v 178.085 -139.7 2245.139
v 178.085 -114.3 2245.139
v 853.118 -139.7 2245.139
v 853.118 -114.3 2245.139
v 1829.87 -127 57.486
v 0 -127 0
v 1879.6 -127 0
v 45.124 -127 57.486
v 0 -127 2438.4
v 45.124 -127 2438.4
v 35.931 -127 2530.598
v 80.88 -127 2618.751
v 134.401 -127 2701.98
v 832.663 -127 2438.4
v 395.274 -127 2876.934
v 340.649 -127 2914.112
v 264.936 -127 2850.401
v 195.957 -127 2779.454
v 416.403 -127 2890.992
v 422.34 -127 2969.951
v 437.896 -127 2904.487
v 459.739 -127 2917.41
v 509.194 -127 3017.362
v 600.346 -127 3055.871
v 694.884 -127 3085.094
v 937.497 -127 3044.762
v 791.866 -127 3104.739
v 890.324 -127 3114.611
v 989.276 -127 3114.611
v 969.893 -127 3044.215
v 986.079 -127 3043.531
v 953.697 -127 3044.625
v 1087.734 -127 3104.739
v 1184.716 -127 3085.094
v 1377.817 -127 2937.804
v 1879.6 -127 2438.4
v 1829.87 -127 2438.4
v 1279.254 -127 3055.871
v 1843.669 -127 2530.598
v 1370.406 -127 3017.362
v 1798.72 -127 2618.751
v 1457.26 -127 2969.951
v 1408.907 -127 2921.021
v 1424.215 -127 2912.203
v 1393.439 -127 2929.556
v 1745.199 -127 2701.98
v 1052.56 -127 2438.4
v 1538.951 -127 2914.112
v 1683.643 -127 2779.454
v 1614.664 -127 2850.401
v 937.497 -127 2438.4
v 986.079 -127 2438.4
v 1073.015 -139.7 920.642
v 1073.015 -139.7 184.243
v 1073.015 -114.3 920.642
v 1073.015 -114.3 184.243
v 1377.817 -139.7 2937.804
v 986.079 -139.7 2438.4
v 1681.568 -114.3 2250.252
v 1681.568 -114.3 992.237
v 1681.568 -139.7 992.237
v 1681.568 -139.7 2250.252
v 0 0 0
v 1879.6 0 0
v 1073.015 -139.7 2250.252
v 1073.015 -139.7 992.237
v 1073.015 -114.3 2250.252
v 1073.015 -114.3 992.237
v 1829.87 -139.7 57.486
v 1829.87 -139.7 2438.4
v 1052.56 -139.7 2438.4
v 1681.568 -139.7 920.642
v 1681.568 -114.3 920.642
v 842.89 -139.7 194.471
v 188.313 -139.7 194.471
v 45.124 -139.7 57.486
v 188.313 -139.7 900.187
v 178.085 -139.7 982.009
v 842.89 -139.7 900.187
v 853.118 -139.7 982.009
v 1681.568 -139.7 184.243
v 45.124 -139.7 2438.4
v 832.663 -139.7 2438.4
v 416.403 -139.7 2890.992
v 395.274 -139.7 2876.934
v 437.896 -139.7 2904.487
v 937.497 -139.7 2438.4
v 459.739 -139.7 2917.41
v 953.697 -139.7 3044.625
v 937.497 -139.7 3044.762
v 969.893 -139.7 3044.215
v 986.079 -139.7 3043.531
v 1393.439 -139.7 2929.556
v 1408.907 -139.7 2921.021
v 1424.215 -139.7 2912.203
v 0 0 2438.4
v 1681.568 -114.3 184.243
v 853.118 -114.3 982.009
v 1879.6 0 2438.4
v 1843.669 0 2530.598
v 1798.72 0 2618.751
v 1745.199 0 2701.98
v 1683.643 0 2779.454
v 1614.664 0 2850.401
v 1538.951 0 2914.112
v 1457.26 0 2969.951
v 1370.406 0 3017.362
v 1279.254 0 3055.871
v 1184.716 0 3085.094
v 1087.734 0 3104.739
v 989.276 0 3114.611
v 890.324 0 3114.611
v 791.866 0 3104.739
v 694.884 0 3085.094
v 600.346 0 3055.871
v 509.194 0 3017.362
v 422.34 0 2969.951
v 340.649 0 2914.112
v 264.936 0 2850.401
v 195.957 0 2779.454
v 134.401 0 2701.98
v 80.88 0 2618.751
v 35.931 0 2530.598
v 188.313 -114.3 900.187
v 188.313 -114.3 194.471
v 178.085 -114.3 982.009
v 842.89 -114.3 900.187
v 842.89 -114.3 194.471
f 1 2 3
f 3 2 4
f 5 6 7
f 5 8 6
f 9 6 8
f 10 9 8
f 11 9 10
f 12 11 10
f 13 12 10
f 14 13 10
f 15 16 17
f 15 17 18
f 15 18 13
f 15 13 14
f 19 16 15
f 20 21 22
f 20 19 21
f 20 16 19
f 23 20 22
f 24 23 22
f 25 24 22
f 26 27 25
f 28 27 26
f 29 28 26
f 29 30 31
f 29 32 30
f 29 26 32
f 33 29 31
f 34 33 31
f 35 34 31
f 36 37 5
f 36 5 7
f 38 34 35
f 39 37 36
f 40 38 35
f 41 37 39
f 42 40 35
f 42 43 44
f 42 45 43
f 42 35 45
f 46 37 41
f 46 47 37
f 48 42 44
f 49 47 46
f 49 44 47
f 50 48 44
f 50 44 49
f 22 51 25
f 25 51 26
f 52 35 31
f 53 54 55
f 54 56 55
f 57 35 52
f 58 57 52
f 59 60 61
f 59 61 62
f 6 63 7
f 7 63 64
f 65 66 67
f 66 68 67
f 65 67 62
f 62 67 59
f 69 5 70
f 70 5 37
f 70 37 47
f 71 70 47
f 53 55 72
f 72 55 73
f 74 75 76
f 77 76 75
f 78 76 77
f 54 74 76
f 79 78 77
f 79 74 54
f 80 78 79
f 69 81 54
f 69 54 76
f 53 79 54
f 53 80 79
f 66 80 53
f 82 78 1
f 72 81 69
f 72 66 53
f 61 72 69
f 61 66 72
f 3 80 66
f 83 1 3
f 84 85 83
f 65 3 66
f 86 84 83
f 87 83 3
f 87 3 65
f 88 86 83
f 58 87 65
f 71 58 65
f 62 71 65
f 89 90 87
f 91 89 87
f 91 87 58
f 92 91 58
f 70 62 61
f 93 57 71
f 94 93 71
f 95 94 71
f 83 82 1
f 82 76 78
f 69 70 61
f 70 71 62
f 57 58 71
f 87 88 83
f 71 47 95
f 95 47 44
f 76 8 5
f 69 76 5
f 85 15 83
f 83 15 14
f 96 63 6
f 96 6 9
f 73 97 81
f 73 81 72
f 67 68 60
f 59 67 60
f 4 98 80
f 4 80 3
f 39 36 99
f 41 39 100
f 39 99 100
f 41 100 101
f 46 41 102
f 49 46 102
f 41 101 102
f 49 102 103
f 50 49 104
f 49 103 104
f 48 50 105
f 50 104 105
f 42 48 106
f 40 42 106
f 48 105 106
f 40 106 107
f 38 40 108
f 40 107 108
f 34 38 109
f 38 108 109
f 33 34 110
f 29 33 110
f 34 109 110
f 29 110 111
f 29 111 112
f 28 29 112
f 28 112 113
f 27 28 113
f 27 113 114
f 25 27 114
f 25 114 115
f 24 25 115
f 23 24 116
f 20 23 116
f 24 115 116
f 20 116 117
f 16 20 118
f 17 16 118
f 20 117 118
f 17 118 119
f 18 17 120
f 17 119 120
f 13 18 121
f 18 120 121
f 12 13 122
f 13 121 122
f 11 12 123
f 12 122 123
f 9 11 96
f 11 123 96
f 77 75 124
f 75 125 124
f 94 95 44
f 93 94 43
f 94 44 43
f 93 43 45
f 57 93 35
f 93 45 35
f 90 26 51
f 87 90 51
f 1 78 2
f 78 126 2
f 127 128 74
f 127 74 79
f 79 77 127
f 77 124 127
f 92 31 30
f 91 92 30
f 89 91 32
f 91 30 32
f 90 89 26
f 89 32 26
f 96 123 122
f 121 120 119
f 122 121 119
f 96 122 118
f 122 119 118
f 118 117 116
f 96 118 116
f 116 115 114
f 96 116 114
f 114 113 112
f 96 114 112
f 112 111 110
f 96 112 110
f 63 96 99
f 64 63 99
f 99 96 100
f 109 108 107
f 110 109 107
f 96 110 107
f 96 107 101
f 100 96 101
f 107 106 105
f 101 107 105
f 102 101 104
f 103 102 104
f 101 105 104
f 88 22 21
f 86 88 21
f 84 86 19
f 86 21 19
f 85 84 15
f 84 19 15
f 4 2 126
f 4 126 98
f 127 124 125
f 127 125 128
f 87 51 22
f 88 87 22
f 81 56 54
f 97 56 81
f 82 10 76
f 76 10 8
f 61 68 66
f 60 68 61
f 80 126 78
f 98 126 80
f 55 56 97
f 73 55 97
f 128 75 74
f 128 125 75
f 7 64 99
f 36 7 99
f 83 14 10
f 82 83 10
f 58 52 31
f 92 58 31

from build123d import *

# Parameters (mm, degrees)
F0_W     = 1879.6
F0_H     = 2438.4
F0_W_2   = 1828.8
F0_H_2   = 2387.6
F1_DEPTH = 127
F2_W     = 675.0328838825
F2_H     = 1263.1295919418
F2_W_2   = 608.5523366928
F2_H_2   = 1258.0157518387
F2_H_3   = 736.3995313644
F2_W_3   = 654.5773297548
F2_H_4   = 705.7162672281
F3_DEPTH = 12.7
F4_W     = 48.5818814486
F4_H     = 2380.9139352679
F4_W_2   = 654.5773297548
F4_H_2   = 705.7162672281
F4_W_3   = 675.0328838825
F4_H_3   = 1263.1295919418
F4_W_4   = 608.5523366928
F4_H_4   = 736.3995313644
F4_H_5   = 1258.0157518387
F5_DEPTH = 12.7


with BuildPart() as f1:
    # F0 (on Front) → F1 (new body)
    with BuildSketch(Plane.XZ):
        with Locations((939.8, 1219.2)):
            Rectangle(F0_W, F0_H)
        with Locations((939.8, 1219.2)):
            Rectangle(F0_W_2, F0_H_2, mode=Mode.SUBTRACT)
        with Locations((939.8, 1219.2)):
            Rectangle(F0_W_2, F0_H_2)
        with BuildLine():
            ThreePointArc((1879.6, 2438.4), (939.8, 3115.8477686492), (0, 2438.4))
            Line((0, 2438.4), (1879.6, 2438.4))
        make_face()
    extrude(amount=F1_DEPTH)

    # F2 (on face) → F3 (cut)
    with BuildSketch(Plane.XZ.offset(127)):
        with Locations((515.6016796827, 1613.5738492012)):
            Rectangle(F2_W, F2_H)
        with Locations((1377.2913813591, 1621.2446093559)):
            Rectangle(F2_W_2, F2_H_2)
        with Locations((1377.2913813591, 552.4426102638)):
            Rectangle(F2_W_2, F2_H_3)
        with Locations((515.601657331, 547.3287627101)):
            Rectangle(F2_W_3, F2_H_4)
    extrude(amount=-F3_DEPTH, mode=Mode.SUBTRACT)

    # F4 (on face) → F5 (join)
    with BuildSketch(Plane.XZ.offset(127)):
        with BuildLine():
            Line((395.2744632943, 2876.9336108596), (832.6625823975, 2438.4))
            Line((832.6625823975, 2438.4), (937.4972153455, 2438.4))
            Line((937.4972153455, 2438.4), (459.7387190608, 2917.4097154998))
            ThreePointArc((459.7387190608, 2917.4097154998), (427.1051939532, 2897.8109483472), (395.2744632943, 2876.9336108596))
        make_face()
        with BuildLine():
            Line((1377.8165414955, 2937.804412016), (986.0790967941, 2438.4))
            Line((986.0790967941, 2438.4), (1052.5596141815, 2438.4))
            Line((1052.5596141815, 2438.4), (1424.2153052564, 2912.2032944876))
            ThreePointArc((1424.2153052564, 2912.2032944876), (1401.1926401654, 2925.3241299178), (1377.8165414955, 2937.804412016))
        make_face()
        with Locations((961.7881560698, 1247.943032366)):
            Rectangle(F4_W, F4_H)
        with BuildLine():
            Line((937.4972153455, 3044.7617533807), (937.4972153455, 2438.4))
            Line((937.4972153455, 2438.4), (986.0790967941, 2438.4))
            Line((986.0790967941, 2438.4), (986.0790967941, 3043.5314722885))
            ThreePointArc((986.0790967941, 3043.5314722885), (961.7959436901, 3044.4541338124), (937.4972153455, 3044.7617533807))
        make_face()
        Polygon((832.6625823975, 2438.4), (45.124206692, 2438.4), (45.124206692, 57.4860647321), (937.4972153455, 57.4860647321), (937.4972153455, 2438.4), align=None)
        with Locations((515.601657331, 547.3287627101)):
            Rectangle(F4_W_2, F4_H_2, mode=Mode.SUBTRACT)
        with Locations((515.6016796827, 1613.5738492012)):
            Rectangle(F4_W_3, F4_H_3, mode=Mode.SUBTRACT)
        Polygon((1052.5596141815, 2438.4), (986.0790967941, 2438.4), (986.0790967941, 57.4860647321), (1829.870223999, 57.4860647321), (1829.870223999, 2438.4), align=None)
        with Locations((1377.2913813591, 552.4426102638)):
            Rectangle(F4_W_4, F4_H_4, mode=Mode.SUBTRACT)
        with Locations((1377.2913813591, 1621.2446093559)):
            Rectangle(F4_W_4, F4_H_5, mode=Mode.SUBTRACT)
    extrude(amount=F5_DEPTH)


solid = f1.part
